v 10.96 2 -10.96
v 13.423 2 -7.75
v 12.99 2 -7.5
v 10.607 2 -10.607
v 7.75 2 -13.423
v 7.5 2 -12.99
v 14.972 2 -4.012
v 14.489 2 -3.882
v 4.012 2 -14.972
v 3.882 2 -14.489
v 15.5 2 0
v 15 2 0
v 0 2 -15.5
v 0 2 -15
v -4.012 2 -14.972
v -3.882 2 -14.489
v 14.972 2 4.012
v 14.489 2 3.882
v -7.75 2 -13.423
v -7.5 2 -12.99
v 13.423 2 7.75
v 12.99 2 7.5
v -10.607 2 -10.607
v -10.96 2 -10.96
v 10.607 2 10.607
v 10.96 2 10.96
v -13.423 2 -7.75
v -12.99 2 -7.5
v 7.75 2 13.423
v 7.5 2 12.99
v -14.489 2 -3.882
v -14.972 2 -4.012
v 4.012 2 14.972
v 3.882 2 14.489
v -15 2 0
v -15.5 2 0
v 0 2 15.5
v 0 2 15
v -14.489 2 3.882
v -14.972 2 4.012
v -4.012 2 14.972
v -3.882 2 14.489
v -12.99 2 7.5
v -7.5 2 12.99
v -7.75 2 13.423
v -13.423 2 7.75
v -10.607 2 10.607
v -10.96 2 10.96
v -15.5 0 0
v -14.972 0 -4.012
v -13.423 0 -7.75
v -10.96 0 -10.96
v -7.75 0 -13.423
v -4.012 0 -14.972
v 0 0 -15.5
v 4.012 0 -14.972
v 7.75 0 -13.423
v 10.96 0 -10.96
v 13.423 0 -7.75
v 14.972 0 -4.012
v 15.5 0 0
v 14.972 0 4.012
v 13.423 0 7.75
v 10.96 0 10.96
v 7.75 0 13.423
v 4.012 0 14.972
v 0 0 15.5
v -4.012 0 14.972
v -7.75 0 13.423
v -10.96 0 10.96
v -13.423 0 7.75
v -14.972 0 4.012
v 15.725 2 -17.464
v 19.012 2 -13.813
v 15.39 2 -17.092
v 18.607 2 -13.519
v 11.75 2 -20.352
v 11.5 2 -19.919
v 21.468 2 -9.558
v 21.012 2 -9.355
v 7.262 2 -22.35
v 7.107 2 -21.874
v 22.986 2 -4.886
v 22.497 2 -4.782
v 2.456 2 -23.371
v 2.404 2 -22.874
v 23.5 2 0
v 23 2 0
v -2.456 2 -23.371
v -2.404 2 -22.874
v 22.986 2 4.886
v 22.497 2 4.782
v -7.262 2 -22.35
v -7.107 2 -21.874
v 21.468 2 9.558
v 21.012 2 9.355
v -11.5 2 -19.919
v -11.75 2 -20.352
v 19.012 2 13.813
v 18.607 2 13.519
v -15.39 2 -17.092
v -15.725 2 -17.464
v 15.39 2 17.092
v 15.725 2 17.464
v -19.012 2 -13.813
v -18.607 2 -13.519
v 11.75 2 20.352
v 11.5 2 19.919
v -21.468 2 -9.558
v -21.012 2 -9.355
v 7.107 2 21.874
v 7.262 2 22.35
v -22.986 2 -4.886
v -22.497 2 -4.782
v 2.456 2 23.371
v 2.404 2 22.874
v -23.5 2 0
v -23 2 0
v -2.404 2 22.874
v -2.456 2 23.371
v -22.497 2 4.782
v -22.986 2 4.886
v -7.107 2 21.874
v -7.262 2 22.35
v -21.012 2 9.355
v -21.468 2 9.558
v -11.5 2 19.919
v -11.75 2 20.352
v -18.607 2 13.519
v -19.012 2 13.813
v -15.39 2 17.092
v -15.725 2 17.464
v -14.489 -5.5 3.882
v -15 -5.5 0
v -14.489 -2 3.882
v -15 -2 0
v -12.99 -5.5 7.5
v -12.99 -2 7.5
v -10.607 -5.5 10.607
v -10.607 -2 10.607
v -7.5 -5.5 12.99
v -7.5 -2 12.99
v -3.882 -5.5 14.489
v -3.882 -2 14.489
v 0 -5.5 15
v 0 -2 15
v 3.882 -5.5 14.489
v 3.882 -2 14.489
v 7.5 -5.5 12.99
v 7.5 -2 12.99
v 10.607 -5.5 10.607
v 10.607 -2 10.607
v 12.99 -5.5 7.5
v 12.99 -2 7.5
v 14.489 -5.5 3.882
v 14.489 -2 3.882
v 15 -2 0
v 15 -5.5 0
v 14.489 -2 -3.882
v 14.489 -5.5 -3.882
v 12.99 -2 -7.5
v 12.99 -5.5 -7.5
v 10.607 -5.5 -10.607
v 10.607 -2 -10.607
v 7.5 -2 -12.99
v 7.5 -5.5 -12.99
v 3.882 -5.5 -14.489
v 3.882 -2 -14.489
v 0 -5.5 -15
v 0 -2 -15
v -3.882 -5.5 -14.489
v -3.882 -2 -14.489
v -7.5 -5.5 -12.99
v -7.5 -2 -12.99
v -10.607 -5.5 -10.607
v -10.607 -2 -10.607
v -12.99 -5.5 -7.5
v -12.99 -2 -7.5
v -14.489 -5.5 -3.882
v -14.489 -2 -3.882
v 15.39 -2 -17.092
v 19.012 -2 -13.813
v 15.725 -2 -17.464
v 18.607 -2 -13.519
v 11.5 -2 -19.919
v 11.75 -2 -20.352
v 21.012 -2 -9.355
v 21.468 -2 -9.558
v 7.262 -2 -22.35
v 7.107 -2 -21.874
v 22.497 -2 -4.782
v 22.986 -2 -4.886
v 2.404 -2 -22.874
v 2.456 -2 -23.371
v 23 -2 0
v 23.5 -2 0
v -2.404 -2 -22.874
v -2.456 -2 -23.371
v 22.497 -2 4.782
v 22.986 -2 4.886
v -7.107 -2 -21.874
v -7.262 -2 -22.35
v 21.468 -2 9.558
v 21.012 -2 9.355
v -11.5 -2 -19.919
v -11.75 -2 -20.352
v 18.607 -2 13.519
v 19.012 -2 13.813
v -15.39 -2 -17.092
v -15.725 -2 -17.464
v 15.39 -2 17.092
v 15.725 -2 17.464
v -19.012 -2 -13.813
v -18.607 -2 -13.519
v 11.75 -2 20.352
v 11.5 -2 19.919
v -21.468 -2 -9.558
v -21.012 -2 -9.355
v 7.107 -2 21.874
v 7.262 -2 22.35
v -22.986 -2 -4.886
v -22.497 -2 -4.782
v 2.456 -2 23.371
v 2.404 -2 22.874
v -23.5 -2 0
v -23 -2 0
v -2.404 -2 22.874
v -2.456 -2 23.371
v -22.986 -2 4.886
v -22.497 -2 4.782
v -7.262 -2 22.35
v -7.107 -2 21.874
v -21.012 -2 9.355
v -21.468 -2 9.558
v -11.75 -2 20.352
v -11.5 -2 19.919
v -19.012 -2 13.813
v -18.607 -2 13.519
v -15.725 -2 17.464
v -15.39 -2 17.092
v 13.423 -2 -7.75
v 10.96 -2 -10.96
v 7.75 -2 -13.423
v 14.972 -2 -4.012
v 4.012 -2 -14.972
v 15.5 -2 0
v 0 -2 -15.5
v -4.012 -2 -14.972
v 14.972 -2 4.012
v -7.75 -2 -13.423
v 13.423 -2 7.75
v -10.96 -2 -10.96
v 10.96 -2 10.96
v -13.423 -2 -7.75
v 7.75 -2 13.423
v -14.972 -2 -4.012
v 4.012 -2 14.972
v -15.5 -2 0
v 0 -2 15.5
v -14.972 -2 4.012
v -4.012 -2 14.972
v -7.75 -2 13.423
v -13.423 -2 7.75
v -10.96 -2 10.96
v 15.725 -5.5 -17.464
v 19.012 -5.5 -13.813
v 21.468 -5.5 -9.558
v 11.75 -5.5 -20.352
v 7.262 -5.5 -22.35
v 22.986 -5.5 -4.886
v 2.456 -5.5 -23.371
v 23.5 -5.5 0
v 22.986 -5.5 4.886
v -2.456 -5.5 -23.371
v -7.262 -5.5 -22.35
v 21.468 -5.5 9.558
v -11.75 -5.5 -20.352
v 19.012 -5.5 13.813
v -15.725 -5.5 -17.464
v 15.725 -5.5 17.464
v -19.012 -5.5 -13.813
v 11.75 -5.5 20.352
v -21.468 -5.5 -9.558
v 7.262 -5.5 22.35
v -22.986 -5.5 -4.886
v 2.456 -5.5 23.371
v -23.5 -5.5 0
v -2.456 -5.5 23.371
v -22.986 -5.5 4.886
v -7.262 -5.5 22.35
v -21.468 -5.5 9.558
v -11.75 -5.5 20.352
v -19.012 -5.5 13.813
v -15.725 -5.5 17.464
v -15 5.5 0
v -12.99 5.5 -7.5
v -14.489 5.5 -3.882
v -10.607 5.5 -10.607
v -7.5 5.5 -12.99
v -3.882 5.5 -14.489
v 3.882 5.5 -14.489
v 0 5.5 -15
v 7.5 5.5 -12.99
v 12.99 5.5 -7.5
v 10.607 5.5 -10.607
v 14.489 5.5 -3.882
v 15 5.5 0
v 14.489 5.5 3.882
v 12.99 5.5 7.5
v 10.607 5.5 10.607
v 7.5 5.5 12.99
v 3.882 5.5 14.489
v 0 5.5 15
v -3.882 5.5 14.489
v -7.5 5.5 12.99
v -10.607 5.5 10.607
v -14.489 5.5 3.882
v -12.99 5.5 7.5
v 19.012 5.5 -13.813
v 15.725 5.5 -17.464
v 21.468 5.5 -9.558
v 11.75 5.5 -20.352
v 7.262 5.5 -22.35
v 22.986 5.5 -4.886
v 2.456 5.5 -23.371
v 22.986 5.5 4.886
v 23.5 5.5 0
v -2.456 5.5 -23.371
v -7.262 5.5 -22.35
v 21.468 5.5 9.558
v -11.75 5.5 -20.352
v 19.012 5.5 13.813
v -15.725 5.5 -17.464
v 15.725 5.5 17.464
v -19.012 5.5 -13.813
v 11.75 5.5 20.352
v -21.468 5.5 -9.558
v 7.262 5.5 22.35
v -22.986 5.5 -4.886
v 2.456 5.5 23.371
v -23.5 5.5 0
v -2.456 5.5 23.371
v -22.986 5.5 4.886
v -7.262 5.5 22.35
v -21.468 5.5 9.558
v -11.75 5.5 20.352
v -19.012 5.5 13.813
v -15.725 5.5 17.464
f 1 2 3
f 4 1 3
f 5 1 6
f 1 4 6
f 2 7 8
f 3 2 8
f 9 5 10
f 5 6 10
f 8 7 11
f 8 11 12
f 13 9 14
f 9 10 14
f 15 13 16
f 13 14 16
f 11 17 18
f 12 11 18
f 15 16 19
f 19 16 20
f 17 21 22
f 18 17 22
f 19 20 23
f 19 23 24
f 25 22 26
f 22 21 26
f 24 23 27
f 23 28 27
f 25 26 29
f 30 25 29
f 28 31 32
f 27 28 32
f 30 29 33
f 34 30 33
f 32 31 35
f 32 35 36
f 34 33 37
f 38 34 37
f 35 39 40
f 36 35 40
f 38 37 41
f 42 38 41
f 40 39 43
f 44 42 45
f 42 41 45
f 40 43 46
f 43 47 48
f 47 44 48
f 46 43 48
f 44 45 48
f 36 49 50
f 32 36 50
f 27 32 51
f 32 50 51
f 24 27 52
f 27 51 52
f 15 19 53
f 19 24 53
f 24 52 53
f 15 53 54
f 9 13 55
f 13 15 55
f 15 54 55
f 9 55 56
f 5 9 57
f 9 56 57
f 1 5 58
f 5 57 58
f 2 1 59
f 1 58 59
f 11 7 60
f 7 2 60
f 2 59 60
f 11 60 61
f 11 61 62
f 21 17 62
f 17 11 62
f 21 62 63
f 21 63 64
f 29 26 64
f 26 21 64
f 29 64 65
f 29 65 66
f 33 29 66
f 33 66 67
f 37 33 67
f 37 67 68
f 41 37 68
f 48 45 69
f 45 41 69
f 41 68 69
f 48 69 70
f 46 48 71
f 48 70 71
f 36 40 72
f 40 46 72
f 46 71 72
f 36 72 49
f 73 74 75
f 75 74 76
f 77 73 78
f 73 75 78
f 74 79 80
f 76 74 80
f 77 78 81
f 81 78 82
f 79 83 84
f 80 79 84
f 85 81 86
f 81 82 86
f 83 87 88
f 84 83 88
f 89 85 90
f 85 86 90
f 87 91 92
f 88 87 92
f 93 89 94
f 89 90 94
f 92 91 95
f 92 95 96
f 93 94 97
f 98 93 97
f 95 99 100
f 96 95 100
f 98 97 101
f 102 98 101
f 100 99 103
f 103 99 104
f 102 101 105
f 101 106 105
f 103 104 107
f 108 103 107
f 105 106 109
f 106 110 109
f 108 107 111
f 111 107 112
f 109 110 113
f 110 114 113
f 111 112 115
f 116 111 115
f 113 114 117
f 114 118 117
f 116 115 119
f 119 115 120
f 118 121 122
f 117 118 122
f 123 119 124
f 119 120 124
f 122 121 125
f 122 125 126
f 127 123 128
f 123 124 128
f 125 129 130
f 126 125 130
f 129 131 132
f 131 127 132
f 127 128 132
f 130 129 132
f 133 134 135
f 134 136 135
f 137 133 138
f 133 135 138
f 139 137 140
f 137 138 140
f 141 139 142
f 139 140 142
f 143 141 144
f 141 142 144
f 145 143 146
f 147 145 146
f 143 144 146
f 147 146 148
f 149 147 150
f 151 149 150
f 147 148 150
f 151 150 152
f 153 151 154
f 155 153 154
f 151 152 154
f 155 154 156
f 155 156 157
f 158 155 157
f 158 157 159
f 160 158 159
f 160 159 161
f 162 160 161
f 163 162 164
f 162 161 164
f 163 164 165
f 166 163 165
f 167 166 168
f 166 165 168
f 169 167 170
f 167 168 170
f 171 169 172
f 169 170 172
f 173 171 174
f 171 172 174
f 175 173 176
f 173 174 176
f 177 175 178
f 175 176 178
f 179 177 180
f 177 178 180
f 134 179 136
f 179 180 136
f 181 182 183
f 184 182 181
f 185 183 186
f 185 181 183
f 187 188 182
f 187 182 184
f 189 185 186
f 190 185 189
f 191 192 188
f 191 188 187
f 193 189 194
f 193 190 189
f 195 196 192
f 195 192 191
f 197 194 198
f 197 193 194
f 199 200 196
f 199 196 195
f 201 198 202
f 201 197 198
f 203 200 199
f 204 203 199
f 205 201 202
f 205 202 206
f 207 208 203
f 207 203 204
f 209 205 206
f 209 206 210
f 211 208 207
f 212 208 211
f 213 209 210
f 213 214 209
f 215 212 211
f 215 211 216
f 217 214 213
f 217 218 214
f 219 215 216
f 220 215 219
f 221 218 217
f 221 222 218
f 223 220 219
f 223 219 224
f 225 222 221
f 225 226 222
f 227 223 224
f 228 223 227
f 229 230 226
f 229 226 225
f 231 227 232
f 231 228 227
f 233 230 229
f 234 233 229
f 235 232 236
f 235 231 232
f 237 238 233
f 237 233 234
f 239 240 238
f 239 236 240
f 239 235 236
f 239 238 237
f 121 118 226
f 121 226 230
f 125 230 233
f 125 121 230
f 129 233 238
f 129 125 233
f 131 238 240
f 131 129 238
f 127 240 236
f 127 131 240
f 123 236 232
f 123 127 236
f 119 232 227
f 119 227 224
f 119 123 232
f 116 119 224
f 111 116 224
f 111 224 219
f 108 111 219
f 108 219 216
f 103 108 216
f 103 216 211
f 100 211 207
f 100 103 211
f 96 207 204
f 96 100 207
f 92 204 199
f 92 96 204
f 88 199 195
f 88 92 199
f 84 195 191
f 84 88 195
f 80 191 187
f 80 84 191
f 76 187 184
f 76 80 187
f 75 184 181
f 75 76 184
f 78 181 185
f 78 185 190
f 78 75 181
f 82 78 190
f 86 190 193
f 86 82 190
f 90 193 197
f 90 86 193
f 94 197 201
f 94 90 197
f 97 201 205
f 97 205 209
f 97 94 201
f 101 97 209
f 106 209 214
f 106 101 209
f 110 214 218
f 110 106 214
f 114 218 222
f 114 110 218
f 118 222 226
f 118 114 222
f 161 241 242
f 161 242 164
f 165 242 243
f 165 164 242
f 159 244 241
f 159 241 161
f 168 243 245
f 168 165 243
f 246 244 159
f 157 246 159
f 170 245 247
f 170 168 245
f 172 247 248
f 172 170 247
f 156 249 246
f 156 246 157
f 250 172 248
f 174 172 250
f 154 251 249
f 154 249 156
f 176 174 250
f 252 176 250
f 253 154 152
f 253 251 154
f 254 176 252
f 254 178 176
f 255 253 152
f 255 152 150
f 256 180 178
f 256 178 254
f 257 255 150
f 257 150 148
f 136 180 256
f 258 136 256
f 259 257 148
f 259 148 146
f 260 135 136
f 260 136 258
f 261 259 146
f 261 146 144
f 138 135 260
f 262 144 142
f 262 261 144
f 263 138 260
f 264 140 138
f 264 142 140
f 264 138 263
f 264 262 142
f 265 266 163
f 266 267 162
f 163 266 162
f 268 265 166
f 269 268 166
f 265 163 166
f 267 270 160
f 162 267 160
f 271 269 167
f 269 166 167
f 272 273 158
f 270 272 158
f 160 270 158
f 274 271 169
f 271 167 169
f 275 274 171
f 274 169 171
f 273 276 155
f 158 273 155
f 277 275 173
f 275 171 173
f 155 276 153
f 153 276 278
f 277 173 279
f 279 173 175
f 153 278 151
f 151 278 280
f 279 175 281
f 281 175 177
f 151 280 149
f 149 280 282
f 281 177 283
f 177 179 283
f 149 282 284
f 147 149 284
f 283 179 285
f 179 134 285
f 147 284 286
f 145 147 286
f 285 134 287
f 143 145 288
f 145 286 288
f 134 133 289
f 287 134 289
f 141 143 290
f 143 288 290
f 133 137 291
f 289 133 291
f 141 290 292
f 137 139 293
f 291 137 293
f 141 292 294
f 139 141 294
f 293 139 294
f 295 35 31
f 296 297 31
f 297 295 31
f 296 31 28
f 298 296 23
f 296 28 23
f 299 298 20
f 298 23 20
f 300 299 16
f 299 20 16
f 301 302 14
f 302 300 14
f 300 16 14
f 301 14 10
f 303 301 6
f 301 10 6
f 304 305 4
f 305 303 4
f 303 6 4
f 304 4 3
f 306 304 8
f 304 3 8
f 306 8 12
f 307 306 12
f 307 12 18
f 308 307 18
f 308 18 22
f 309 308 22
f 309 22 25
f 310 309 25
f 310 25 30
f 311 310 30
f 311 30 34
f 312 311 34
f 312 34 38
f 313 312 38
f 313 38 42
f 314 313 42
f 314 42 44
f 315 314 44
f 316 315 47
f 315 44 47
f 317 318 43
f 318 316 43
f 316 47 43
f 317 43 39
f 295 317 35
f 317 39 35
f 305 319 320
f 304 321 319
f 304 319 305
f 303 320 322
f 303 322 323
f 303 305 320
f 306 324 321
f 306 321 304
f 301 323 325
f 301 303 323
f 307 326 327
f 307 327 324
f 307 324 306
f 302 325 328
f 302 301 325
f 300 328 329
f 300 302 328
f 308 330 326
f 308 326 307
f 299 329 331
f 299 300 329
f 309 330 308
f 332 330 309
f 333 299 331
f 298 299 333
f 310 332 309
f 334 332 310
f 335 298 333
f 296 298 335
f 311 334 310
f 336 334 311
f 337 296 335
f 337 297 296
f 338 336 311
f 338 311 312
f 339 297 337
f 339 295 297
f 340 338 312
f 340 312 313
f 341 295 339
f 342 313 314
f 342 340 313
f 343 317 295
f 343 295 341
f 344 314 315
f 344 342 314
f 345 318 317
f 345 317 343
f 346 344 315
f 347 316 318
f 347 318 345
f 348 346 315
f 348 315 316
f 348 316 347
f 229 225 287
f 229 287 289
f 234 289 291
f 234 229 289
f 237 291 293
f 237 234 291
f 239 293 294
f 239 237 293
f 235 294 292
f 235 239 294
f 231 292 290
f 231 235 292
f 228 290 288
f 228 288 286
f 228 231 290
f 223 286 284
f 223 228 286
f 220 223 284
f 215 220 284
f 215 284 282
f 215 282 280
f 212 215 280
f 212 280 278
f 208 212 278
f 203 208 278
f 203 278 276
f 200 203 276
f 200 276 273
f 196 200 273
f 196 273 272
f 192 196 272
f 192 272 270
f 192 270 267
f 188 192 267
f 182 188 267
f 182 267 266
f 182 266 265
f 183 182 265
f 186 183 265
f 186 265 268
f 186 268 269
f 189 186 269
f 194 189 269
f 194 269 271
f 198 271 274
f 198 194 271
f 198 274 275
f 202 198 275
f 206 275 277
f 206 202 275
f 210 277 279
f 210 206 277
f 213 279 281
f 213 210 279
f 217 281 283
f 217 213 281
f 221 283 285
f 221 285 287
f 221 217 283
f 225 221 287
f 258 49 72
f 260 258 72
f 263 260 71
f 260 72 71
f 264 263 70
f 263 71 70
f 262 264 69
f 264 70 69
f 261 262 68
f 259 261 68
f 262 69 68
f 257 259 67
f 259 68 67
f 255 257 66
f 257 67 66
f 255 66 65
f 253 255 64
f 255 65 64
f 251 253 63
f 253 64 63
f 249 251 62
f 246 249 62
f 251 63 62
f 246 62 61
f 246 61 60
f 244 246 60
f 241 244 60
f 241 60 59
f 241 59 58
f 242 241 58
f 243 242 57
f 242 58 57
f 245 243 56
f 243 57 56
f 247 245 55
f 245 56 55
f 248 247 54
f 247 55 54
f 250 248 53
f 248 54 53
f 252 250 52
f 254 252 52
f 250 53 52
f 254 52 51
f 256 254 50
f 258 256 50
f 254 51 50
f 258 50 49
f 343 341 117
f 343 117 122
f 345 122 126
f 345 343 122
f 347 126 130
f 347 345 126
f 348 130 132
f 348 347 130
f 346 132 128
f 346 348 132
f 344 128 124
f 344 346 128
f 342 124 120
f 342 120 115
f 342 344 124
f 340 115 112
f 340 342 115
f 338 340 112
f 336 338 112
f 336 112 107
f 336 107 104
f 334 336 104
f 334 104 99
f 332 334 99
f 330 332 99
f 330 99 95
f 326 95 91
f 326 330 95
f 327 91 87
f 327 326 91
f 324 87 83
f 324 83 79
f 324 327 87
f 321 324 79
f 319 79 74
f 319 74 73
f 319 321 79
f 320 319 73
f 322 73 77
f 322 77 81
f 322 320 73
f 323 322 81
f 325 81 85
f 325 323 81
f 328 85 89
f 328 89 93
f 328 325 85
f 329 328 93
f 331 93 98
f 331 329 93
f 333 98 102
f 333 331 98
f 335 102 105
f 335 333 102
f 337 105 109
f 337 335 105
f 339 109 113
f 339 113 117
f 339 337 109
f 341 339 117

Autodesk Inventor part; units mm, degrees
ref_plane "YZ Plane" through (0, 0, 0) normal (1, 0, 0) x (0, 1, 0)
ref_plane "XZ Plane" through (0, 0, 0) normal (0, 1, 0) x (-1, 0, 0)
ref_plane "XY Plane" through (0, 0, 0) normal (0, 0, 1) x (1, 0, 0)
sketch "Sketch1" plane through (0, 0, 0) normal (0, 1, 0) x (-1, 0, 0)
  circle A0 centre (0, 0) radius 15
  circle A1 centre (0, 0) radius 23.5
  circle A2 centre (0, 0) radius 15.5
  circle A3 centre (0, 0) radius 23
  dimension "d0" = 30
  dimension "d1" = 47
  dimension "d2" = 0.5
  dimension "d3" = 0.5
extrude "Extrusion1" add sketch "Sketch1" along normal mid plane 11 contours A1 | A2 | A3
extrude "Extrusion2" cut sketch "Sketch1" along normal mid plane 4
properties part number "Thrust Bearing 51106 - 30x47x11mm" material "Stainless Steel"
